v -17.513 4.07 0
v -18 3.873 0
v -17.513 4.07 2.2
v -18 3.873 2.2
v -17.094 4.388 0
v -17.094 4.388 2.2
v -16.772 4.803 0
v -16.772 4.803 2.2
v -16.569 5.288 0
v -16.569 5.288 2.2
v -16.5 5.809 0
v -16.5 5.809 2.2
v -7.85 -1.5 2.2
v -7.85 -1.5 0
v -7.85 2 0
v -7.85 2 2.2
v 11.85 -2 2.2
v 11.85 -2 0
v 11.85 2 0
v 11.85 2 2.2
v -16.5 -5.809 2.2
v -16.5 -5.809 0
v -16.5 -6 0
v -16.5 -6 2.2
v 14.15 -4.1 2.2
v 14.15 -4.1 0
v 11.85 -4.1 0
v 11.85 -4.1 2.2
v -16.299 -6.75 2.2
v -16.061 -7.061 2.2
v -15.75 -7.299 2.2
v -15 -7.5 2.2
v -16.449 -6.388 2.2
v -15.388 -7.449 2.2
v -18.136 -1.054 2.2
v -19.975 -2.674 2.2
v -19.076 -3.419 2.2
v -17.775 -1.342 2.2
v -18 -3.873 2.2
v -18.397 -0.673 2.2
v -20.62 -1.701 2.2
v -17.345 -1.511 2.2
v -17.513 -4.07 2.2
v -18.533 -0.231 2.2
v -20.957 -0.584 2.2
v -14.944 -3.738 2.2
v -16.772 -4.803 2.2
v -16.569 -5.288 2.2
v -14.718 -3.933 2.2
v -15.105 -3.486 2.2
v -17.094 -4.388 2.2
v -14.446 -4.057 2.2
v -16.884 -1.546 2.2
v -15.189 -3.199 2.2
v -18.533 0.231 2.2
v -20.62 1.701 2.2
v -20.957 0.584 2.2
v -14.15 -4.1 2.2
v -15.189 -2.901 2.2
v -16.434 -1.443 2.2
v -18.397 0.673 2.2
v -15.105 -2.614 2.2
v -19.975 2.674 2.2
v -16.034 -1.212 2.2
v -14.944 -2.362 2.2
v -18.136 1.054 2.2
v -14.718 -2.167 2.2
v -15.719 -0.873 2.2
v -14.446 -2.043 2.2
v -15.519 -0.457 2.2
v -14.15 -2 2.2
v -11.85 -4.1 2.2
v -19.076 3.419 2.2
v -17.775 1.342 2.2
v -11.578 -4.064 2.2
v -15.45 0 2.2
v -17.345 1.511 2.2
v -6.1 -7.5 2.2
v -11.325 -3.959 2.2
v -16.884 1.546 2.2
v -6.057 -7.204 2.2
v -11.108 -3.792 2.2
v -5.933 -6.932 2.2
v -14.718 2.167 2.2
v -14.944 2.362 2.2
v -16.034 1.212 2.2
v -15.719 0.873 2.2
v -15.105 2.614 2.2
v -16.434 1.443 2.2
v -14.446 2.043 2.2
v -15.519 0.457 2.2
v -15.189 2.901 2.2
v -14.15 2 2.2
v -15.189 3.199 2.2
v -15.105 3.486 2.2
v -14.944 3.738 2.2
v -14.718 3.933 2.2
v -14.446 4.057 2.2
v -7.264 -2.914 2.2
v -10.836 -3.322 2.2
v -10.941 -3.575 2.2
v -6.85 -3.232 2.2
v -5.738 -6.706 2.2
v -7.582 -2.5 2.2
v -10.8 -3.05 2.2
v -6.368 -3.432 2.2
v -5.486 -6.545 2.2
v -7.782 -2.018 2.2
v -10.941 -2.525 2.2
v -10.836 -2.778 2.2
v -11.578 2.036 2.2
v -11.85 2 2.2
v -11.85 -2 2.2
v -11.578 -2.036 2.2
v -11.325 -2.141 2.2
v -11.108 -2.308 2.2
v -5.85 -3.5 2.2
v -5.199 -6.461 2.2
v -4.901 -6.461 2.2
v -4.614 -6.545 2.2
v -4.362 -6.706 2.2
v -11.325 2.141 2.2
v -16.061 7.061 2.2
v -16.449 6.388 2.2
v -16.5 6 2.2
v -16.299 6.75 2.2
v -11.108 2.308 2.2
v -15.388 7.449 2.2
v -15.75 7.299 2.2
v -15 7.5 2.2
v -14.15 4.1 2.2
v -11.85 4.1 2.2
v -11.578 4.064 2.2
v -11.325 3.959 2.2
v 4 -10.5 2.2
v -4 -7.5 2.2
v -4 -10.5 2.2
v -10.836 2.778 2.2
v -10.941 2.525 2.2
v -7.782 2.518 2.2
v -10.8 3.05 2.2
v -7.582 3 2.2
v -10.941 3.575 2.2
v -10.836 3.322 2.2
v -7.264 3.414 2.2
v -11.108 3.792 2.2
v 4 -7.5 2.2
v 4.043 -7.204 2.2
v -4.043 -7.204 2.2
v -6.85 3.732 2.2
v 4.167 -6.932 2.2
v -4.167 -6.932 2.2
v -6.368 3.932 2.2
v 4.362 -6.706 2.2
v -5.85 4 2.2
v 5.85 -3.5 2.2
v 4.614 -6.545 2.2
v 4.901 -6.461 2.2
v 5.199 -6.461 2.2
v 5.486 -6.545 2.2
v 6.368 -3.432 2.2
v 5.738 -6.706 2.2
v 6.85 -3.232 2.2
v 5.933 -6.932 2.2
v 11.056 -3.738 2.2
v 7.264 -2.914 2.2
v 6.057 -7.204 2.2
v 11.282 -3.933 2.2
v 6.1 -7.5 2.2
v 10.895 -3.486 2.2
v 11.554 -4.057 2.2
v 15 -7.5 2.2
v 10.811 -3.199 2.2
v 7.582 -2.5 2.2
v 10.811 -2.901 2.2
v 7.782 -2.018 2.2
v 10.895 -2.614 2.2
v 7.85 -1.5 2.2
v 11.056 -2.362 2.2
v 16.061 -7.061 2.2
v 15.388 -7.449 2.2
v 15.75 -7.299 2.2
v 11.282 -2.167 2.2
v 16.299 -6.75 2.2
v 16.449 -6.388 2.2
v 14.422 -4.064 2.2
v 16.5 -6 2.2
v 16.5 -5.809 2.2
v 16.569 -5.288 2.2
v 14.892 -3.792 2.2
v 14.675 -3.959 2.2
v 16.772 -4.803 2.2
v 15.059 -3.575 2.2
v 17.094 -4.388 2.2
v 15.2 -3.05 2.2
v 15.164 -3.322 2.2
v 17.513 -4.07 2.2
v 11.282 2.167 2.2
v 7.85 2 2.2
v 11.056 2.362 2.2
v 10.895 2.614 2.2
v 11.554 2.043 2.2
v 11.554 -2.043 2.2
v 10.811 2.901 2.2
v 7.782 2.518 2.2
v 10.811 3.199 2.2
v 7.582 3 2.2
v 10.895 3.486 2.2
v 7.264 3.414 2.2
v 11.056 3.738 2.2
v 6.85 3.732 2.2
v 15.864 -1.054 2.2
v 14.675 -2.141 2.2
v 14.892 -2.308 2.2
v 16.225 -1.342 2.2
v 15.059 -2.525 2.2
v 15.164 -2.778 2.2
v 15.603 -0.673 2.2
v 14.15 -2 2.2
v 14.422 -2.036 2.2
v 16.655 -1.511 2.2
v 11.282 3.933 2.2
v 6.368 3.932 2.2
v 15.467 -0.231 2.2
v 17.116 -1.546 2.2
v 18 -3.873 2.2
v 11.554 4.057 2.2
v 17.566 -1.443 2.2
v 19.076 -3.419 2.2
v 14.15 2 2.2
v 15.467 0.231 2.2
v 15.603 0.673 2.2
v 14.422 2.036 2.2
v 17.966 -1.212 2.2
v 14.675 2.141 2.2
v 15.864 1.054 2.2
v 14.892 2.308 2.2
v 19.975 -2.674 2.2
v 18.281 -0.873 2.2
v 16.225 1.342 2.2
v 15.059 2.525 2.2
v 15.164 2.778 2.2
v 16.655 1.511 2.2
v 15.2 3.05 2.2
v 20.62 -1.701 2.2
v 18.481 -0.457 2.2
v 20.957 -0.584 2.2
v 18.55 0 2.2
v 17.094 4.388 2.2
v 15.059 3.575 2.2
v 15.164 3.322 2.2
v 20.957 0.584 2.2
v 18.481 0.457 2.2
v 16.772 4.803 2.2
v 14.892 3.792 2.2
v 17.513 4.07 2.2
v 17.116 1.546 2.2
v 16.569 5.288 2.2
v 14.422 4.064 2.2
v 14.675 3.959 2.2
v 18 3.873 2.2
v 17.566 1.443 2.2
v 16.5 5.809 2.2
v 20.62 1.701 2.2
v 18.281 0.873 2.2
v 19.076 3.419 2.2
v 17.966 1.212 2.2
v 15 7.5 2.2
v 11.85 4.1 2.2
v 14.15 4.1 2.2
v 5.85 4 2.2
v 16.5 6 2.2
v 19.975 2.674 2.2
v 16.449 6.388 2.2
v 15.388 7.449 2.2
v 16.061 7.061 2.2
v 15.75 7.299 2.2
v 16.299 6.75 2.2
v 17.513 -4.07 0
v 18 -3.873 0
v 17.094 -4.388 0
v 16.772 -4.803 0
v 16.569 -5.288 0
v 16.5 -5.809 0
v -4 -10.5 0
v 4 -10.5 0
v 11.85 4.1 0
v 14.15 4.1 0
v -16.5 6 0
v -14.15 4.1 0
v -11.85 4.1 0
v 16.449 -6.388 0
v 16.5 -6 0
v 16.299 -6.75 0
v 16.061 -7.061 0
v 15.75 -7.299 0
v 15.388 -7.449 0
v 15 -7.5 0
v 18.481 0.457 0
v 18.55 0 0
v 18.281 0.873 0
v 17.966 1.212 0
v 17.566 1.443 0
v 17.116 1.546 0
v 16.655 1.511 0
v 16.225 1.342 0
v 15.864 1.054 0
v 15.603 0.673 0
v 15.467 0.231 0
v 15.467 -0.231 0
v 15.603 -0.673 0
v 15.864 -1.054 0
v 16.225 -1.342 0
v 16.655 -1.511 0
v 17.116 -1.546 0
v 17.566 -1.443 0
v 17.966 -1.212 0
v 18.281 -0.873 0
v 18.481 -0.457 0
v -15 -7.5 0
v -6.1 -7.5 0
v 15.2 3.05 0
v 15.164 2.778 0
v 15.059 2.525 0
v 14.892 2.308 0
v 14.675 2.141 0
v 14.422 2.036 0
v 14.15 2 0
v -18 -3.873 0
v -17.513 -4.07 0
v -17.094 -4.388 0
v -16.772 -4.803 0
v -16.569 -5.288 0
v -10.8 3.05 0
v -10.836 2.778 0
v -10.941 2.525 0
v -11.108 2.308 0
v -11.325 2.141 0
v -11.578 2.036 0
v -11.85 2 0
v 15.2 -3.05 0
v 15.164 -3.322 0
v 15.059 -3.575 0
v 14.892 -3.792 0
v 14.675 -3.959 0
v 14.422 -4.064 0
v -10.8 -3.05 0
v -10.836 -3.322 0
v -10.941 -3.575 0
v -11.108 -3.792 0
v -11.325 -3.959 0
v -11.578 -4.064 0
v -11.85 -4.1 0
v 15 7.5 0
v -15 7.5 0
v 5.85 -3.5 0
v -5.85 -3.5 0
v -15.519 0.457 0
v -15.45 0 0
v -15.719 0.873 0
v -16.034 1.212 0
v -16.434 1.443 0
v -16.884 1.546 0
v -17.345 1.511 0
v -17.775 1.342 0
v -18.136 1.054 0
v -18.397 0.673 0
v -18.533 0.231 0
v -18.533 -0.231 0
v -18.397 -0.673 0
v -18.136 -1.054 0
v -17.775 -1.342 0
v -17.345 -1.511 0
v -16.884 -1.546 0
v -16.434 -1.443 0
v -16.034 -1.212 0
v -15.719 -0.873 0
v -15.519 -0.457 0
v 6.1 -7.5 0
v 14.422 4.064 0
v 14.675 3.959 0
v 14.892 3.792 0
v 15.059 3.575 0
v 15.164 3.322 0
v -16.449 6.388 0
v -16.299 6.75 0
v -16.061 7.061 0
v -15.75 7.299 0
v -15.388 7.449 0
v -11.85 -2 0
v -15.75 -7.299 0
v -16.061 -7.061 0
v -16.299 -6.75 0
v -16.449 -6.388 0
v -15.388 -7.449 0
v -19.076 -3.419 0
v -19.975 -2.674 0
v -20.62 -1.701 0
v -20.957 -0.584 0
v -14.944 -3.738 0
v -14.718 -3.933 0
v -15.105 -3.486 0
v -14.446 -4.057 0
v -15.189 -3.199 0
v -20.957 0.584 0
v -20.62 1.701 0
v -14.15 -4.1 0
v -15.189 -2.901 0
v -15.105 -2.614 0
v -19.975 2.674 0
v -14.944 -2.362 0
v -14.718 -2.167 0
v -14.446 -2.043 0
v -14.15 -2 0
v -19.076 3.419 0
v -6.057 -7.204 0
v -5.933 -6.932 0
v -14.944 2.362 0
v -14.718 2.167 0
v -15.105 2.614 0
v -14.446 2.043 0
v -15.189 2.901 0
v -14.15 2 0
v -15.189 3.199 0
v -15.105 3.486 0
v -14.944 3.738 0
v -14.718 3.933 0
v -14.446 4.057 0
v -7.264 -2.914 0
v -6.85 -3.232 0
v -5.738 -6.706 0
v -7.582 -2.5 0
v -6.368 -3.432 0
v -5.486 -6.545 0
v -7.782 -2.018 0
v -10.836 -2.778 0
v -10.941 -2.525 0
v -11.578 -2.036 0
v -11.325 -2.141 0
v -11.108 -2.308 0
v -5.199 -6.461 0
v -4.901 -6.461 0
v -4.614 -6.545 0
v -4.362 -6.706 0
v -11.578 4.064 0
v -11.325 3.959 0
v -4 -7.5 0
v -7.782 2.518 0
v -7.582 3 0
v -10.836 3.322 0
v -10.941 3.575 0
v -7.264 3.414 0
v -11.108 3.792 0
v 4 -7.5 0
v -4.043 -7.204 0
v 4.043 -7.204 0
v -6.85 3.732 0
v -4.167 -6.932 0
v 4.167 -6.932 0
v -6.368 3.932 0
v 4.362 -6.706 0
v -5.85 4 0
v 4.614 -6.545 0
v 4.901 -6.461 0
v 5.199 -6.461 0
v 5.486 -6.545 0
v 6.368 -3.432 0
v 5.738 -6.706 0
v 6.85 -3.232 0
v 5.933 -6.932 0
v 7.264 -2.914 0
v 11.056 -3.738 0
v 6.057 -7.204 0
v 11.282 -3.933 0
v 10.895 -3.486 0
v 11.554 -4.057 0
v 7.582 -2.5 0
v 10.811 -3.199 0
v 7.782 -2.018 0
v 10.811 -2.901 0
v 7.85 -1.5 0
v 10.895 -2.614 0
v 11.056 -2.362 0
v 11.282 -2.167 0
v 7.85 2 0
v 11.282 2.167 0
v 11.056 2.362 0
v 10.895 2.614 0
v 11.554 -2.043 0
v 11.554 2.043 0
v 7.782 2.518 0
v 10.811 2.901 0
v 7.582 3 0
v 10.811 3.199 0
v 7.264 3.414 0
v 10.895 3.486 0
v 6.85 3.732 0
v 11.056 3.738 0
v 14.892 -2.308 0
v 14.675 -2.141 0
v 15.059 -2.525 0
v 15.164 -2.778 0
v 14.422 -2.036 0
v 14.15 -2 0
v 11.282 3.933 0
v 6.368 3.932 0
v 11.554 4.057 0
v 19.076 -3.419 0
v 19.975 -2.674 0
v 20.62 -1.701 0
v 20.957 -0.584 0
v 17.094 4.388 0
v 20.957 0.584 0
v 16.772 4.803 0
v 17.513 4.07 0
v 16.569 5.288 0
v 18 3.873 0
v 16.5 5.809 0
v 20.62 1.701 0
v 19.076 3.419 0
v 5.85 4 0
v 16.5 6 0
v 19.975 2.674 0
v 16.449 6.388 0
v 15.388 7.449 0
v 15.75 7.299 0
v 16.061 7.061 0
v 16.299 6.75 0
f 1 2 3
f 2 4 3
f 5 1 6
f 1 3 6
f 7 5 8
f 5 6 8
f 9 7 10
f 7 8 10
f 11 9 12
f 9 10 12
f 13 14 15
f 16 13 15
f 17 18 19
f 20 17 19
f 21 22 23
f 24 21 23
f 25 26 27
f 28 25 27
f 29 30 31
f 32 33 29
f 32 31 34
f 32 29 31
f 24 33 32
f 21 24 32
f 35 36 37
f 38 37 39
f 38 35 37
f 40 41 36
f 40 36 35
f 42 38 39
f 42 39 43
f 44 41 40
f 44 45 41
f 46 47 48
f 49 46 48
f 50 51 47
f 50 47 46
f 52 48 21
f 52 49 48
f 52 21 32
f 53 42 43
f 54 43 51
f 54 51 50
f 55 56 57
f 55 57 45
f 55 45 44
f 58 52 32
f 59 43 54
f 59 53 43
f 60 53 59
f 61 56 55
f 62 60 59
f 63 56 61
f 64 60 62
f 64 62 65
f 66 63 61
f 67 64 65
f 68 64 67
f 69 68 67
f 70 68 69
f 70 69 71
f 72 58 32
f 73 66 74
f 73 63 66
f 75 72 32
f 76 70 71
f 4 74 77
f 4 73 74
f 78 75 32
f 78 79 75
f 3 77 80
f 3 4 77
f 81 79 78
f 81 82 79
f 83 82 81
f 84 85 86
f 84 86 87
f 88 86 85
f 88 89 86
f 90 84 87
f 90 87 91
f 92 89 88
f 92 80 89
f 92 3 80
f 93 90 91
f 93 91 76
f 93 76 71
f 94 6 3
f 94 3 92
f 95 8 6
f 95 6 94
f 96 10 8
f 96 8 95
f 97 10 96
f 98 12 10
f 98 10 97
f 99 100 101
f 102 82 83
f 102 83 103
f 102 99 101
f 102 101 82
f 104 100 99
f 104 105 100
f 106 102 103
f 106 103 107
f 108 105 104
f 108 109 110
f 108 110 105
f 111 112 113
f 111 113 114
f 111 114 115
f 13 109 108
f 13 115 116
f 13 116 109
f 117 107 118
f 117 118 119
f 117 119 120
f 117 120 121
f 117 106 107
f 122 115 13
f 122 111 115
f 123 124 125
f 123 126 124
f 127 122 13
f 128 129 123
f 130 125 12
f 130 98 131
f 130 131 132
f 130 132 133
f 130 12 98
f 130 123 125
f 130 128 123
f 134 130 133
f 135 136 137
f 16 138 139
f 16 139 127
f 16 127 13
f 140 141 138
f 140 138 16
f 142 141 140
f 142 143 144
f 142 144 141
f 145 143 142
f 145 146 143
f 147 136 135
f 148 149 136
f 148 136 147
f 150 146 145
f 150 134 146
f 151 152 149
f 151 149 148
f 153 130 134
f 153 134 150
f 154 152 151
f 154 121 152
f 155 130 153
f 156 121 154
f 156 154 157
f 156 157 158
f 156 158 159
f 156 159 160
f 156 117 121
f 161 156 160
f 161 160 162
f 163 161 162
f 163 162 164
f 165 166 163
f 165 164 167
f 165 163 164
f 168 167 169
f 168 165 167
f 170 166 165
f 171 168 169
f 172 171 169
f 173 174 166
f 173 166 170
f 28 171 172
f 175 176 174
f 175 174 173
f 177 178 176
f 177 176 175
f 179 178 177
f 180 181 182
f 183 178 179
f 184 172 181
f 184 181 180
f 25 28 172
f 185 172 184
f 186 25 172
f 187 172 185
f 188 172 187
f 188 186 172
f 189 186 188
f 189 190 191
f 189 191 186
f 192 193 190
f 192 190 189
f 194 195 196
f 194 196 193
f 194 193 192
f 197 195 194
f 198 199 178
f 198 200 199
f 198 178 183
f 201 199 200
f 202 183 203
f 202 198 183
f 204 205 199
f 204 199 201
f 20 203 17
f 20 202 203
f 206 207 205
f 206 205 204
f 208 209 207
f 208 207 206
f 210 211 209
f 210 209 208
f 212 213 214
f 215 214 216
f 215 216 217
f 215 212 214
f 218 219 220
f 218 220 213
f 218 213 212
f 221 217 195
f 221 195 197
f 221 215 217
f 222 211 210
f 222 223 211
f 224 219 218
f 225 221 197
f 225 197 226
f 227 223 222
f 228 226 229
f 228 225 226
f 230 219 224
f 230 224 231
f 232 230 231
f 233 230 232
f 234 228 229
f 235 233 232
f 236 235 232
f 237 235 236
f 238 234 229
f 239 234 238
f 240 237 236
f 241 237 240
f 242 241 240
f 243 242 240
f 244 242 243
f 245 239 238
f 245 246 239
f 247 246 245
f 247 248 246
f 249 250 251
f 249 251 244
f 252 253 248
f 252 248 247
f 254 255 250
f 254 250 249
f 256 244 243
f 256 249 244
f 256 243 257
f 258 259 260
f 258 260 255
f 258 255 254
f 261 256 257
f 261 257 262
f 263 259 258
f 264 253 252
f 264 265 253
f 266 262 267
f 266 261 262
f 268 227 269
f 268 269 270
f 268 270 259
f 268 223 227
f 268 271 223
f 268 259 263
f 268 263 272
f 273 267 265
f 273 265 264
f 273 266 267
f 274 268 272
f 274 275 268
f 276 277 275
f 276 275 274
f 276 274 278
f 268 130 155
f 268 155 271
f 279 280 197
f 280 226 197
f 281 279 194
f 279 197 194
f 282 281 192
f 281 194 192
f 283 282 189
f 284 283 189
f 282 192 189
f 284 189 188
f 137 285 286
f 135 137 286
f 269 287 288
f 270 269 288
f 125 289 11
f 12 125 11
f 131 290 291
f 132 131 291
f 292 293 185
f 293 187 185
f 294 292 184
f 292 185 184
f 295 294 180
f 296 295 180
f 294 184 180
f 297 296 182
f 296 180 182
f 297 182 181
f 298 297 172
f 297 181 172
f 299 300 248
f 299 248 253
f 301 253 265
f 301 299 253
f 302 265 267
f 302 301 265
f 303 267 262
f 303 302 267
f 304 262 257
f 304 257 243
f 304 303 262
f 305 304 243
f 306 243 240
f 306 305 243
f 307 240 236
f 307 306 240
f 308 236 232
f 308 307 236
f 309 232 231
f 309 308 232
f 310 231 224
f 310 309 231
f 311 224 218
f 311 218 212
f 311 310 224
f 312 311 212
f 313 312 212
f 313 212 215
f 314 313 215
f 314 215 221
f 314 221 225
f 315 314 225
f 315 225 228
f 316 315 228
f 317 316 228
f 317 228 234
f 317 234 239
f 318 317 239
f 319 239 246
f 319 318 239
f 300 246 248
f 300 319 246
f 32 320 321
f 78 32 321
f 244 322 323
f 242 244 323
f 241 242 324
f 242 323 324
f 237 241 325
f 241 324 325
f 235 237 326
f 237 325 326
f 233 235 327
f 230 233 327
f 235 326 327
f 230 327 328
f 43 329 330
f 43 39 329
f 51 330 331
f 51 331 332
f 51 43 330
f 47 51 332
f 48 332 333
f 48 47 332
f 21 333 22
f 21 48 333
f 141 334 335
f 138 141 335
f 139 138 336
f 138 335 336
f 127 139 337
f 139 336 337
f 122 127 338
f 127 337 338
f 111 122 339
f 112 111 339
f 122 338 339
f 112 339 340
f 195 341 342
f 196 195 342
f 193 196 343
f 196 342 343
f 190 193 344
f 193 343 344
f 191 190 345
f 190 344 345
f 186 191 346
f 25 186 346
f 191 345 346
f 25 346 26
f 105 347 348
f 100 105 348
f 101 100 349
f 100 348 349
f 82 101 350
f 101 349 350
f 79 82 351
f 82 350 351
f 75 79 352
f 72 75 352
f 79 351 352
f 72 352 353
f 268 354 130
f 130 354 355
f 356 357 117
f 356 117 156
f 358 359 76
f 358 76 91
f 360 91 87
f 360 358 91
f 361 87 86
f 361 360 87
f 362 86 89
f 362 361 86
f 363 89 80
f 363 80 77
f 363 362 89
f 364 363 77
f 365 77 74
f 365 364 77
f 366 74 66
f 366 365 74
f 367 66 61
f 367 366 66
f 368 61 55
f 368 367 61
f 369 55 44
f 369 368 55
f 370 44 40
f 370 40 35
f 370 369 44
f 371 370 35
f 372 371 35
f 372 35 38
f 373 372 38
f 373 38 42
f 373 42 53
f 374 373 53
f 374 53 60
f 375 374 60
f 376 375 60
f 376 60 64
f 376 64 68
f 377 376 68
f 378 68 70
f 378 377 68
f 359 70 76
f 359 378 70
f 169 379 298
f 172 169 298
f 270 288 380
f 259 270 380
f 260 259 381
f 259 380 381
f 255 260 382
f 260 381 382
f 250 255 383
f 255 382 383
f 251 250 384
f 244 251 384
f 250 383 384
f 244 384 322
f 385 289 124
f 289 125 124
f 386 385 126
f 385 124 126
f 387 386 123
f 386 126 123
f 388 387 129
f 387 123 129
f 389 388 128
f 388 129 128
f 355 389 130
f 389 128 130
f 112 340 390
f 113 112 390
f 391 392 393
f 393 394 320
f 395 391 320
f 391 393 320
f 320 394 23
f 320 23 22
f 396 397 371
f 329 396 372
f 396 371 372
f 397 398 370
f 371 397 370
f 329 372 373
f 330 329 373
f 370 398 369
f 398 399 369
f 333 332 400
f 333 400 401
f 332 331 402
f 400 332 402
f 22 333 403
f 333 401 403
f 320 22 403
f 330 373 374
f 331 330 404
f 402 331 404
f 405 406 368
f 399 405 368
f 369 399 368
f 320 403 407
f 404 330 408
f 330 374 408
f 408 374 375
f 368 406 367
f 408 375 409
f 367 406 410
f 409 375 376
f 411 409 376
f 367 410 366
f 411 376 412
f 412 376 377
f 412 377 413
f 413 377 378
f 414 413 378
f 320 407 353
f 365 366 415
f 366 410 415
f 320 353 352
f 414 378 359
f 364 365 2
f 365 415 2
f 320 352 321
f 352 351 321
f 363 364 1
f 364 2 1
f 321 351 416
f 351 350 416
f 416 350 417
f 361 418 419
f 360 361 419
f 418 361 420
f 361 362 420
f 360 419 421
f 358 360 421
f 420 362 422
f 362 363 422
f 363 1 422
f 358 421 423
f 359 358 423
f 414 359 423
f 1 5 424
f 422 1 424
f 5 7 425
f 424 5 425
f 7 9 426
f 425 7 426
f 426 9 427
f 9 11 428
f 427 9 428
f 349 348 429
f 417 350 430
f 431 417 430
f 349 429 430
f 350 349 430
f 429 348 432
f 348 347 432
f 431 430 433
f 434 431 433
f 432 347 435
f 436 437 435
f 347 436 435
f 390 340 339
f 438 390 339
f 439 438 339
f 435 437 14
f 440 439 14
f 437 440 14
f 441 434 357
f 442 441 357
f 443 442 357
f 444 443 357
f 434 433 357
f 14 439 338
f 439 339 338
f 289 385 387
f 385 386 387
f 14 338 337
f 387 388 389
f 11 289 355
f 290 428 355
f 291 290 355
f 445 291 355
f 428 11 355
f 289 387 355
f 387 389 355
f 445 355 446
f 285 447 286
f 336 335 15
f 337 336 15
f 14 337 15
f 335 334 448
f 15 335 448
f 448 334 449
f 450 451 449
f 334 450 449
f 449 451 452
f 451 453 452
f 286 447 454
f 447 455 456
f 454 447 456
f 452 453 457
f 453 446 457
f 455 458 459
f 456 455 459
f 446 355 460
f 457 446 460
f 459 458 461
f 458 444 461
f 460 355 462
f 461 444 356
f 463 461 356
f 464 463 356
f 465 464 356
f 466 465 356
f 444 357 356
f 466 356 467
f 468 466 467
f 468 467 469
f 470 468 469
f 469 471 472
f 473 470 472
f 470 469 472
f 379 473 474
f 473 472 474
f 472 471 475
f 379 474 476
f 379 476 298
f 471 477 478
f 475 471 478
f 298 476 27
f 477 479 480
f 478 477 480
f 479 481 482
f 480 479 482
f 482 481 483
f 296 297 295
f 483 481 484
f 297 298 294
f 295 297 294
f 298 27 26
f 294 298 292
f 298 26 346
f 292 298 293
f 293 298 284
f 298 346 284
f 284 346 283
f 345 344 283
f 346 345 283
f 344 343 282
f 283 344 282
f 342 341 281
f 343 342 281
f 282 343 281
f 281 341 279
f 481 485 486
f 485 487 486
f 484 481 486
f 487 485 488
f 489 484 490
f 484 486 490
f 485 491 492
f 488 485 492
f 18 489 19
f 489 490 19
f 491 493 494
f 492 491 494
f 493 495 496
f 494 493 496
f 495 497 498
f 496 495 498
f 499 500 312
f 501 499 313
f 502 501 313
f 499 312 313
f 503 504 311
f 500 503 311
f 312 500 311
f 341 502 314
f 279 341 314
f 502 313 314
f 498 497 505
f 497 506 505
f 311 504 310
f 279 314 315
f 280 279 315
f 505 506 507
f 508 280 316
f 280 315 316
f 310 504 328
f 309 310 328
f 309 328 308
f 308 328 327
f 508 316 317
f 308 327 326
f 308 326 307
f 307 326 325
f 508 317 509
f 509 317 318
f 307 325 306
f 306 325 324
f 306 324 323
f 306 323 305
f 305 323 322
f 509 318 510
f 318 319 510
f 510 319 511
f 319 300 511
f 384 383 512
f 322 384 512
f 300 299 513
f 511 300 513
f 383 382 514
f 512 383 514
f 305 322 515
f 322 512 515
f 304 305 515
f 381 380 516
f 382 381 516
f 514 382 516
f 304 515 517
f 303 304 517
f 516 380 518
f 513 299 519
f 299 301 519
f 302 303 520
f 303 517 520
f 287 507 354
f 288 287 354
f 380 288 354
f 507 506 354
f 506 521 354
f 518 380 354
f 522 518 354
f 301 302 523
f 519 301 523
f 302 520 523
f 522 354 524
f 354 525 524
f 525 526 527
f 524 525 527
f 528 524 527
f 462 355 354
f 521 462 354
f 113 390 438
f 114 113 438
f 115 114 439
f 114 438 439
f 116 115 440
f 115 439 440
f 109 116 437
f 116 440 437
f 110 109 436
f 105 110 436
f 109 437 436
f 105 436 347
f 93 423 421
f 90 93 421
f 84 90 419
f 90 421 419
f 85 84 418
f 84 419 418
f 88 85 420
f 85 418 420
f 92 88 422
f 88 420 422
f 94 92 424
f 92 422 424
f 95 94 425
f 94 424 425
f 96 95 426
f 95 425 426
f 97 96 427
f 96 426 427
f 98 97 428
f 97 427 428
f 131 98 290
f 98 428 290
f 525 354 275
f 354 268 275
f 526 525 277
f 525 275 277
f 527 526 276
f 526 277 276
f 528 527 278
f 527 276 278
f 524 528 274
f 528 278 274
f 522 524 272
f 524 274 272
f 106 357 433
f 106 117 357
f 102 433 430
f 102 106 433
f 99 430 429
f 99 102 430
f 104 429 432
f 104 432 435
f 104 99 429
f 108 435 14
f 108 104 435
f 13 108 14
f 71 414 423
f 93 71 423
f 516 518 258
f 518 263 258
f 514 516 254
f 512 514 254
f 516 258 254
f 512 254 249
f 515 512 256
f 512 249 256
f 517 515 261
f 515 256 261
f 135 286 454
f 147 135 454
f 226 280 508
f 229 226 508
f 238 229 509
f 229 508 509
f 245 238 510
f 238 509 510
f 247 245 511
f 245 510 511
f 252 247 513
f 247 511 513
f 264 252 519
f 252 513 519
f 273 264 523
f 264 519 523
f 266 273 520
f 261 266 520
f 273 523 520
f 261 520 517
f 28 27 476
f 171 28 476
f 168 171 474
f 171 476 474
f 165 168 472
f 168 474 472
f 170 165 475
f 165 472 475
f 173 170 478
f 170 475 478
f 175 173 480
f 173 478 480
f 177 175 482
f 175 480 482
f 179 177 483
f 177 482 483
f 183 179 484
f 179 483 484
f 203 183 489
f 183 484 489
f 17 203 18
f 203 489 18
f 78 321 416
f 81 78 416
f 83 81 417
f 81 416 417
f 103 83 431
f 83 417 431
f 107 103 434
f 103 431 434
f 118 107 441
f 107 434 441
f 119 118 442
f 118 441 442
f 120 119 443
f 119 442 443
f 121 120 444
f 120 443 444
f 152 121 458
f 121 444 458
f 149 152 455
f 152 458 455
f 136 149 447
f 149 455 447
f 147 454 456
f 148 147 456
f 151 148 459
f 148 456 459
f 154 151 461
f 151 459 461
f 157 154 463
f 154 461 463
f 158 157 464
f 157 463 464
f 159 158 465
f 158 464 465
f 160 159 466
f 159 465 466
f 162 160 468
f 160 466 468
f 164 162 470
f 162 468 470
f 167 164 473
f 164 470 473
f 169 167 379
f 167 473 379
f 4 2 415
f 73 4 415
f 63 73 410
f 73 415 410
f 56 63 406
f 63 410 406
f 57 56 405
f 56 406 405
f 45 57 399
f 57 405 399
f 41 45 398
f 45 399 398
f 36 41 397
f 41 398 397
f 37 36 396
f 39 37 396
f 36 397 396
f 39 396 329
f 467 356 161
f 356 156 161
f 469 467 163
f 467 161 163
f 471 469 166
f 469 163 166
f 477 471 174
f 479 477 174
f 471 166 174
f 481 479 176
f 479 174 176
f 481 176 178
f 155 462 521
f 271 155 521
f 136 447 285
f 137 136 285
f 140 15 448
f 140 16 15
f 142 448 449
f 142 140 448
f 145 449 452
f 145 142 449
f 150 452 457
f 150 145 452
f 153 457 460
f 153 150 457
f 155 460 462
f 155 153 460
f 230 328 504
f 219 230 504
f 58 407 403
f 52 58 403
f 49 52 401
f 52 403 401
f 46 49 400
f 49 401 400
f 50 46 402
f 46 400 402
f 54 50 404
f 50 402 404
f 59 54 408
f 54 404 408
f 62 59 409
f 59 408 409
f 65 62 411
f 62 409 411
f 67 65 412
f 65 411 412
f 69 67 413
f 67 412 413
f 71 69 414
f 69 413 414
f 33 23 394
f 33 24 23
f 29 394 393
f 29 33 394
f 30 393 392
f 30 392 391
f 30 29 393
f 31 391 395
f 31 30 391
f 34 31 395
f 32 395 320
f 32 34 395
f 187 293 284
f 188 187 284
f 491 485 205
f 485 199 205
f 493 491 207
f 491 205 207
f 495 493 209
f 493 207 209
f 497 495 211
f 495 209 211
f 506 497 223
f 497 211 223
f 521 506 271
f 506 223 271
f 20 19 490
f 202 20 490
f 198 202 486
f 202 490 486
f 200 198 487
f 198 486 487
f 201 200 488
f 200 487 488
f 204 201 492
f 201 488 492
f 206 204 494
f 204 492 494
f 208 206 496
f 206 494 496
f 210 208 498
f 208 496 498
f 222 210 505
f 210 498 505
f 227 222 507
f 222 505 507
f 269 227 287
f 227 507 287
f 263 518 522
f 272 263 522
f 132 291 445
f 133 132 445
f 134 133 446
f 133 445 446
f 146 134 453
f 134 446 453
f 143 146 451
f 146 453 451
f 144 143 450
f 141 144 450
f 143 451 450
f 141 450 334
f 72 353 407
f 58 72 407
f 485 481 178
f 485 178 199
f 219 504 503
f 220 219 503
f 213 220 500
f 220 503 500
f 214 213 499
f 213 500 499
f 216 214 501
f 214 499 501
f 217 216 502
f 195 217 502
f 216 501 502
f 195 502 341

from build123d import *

# Parameters (mm, degrees)
SKETCH_1_R      = 1.55
SKETCH_1_W      = 15.7
SKETCH_1_H      = 7.5
EXTRUDE_1_DEPTH = 2.2
FILLET_1_R      = 2
FILLET_2_R      = 1.5
FILLET_3_R      = 2


with BuildPart() as part:
    # 草图1 → 凸台-拉伸1 (new body)
    with BuildSketch(Plane.XY):
        with BuildLine():
            ThreePointArc((-16.5, 3.968626967), (-21, 0), (-16.5, -3.968626967))
            Line((-16.5, -3.968626967), (-16.5, -7.5))
            Line((-16.5, -7.5), (-6.1, -7.5))
            ThreePointArc((-6.1, -7.5), (-5.05, -6.45), (-4, -7.5))
            Line((-4, -7.5), (-4, -10.5))
            Line((-4, -10.5), (4, -10.5))
            Line((4, -10.5), (4, -7.5))
            ThreePointArc((4, -7.5), (5.05, -6.45), (6.1, -7.5))
            Line((6.1, -7.5), (16.5, -7.5))
            Line((16.5, -7.5), (16.5, -3.968626967))
            ThreePointArc((16.5, -3.968626967), (21, 0), (16.5, 3.968626967))
            Line((16.5, 3.968626967), (16.5, 7.5))
            Line((16.5, 7.5), (-16.5, 7.5))
            Line((-16.5, 7.5), (-16.5, 3.968626967))
        make_face()
        with Locations((-17, 0)):
            Circle(SKETCH_1_R, mode=Mode.SUBTRACT)
        with BuildLine():
            Line((-14.15, 4.1), (-11.85, 4.1))
            ThreePointArc((-11.85, 4.1), (-11.10753788, 3.79246212), (-10.8, 3.05))
            ThreePointArc((-10.8, 3.05), (-11.10753788, 2.30753788), (-11.85, 2))
            Line((-11.85, 2), (-11.85, -2))
            ThreePointArc((-11.85, -2), (-11.10753788, -2.30753788), (-10.8, -3.05))
            ThreePointArc((-10.8, -3.05), (-11.10753788, -3.79246212), (-11.85, -4.1))
            Line((-11.85, -4.1), (-14.15, -4.1))
            ThreePointArc((-14.15, -4.1), (-15.2, -3.05), (-14.15, -2))
            Line((-14.15, -2), (-14.15, 2))
            ThreePointArc((-14.15, 2), (-15.2, 3.05), (-14.15, 4.1))
        make_face(mode=Mode.SUBTRACT)
        with Locations((0, 0.25)):
            Rectangle(SKETCH_1_W, SKETCH_1_H, mode=Mode.SUBTRACT)
        with BuildLine():
            Line((11.85, 4.1), (14.15, 4.1))
            ThreePointArc((14.15, 4.1), (14.89246212, 3.79246212), (15.2, 3.05))
            ThreePointArc((15.2, 3.05), (14.89246212, 2.30753788), (14.15, 2))
            Line((14.15, 2), (14.15, -2))
            ThreePointArc((14.15, -2), (14.89246212, -2.30753788), (15.2, -3.05))
            ThreePointArc((15.2, -3.05), (14.89246212, -3.79246212), (14.15, -4.1))
            Line((14.15, -4.1), (11.85, -4.1))
            ThreePointArc((11.85, -4.1), (10.8, -3.05), (11.85, -2))
            Line((11.85, -2), (11.85, 2))
            ThreePointArc((11.85, 2), (10.8, 3.05), (11.85, 4.1))
        make_face(mode=Mode.SUBTRACT)
        with Locations((17, 0)):
            Circle(SKETCH_1_R, mode=Mode.SUBTRACT)
    extrude(amount=EXTRUDE_1_DEPTH)

    # 圆角1
    fillet_1_edges = [part.edges().sort_by_distance(p)[0] for p in [
        (-16.5, -3.968626967, 1.1),
        (-16.5, 3.968626967, 1.1),
        (16.5, 3.968626967, 1.1),
        (16.5, -3.968626967, 1.1),
    ]]
    fillet(fillet_1_edges, radius=FILLET_1_R)

    # 圆角2
    fillet_2_edges = [part.edges().sort_by_distance(p)[0] for p in [
        (-16.5, -7.5, 1.1),
        (-16.5, 7.5, 1.1),
        (16.5, 7.5, 1.1),
        (16.5, -7.5, 1.1),
    ]]
    fillet(fillet_2_edges, radius=FILLET_2_R)

    # 圆角3
    fillet_3_edges = [part.edges().sort_by_distance(p)[0] for p in [
        (-7.85, -3.5, 1.1),
        (7.85, -3.5, 1.1),
        (7.85, 4, 1.1),
        (-7.85, 4, 1.1),
    ]]
    fillet(fillet_3_edges, radius=FILLET_3_R)


solid = part.part
